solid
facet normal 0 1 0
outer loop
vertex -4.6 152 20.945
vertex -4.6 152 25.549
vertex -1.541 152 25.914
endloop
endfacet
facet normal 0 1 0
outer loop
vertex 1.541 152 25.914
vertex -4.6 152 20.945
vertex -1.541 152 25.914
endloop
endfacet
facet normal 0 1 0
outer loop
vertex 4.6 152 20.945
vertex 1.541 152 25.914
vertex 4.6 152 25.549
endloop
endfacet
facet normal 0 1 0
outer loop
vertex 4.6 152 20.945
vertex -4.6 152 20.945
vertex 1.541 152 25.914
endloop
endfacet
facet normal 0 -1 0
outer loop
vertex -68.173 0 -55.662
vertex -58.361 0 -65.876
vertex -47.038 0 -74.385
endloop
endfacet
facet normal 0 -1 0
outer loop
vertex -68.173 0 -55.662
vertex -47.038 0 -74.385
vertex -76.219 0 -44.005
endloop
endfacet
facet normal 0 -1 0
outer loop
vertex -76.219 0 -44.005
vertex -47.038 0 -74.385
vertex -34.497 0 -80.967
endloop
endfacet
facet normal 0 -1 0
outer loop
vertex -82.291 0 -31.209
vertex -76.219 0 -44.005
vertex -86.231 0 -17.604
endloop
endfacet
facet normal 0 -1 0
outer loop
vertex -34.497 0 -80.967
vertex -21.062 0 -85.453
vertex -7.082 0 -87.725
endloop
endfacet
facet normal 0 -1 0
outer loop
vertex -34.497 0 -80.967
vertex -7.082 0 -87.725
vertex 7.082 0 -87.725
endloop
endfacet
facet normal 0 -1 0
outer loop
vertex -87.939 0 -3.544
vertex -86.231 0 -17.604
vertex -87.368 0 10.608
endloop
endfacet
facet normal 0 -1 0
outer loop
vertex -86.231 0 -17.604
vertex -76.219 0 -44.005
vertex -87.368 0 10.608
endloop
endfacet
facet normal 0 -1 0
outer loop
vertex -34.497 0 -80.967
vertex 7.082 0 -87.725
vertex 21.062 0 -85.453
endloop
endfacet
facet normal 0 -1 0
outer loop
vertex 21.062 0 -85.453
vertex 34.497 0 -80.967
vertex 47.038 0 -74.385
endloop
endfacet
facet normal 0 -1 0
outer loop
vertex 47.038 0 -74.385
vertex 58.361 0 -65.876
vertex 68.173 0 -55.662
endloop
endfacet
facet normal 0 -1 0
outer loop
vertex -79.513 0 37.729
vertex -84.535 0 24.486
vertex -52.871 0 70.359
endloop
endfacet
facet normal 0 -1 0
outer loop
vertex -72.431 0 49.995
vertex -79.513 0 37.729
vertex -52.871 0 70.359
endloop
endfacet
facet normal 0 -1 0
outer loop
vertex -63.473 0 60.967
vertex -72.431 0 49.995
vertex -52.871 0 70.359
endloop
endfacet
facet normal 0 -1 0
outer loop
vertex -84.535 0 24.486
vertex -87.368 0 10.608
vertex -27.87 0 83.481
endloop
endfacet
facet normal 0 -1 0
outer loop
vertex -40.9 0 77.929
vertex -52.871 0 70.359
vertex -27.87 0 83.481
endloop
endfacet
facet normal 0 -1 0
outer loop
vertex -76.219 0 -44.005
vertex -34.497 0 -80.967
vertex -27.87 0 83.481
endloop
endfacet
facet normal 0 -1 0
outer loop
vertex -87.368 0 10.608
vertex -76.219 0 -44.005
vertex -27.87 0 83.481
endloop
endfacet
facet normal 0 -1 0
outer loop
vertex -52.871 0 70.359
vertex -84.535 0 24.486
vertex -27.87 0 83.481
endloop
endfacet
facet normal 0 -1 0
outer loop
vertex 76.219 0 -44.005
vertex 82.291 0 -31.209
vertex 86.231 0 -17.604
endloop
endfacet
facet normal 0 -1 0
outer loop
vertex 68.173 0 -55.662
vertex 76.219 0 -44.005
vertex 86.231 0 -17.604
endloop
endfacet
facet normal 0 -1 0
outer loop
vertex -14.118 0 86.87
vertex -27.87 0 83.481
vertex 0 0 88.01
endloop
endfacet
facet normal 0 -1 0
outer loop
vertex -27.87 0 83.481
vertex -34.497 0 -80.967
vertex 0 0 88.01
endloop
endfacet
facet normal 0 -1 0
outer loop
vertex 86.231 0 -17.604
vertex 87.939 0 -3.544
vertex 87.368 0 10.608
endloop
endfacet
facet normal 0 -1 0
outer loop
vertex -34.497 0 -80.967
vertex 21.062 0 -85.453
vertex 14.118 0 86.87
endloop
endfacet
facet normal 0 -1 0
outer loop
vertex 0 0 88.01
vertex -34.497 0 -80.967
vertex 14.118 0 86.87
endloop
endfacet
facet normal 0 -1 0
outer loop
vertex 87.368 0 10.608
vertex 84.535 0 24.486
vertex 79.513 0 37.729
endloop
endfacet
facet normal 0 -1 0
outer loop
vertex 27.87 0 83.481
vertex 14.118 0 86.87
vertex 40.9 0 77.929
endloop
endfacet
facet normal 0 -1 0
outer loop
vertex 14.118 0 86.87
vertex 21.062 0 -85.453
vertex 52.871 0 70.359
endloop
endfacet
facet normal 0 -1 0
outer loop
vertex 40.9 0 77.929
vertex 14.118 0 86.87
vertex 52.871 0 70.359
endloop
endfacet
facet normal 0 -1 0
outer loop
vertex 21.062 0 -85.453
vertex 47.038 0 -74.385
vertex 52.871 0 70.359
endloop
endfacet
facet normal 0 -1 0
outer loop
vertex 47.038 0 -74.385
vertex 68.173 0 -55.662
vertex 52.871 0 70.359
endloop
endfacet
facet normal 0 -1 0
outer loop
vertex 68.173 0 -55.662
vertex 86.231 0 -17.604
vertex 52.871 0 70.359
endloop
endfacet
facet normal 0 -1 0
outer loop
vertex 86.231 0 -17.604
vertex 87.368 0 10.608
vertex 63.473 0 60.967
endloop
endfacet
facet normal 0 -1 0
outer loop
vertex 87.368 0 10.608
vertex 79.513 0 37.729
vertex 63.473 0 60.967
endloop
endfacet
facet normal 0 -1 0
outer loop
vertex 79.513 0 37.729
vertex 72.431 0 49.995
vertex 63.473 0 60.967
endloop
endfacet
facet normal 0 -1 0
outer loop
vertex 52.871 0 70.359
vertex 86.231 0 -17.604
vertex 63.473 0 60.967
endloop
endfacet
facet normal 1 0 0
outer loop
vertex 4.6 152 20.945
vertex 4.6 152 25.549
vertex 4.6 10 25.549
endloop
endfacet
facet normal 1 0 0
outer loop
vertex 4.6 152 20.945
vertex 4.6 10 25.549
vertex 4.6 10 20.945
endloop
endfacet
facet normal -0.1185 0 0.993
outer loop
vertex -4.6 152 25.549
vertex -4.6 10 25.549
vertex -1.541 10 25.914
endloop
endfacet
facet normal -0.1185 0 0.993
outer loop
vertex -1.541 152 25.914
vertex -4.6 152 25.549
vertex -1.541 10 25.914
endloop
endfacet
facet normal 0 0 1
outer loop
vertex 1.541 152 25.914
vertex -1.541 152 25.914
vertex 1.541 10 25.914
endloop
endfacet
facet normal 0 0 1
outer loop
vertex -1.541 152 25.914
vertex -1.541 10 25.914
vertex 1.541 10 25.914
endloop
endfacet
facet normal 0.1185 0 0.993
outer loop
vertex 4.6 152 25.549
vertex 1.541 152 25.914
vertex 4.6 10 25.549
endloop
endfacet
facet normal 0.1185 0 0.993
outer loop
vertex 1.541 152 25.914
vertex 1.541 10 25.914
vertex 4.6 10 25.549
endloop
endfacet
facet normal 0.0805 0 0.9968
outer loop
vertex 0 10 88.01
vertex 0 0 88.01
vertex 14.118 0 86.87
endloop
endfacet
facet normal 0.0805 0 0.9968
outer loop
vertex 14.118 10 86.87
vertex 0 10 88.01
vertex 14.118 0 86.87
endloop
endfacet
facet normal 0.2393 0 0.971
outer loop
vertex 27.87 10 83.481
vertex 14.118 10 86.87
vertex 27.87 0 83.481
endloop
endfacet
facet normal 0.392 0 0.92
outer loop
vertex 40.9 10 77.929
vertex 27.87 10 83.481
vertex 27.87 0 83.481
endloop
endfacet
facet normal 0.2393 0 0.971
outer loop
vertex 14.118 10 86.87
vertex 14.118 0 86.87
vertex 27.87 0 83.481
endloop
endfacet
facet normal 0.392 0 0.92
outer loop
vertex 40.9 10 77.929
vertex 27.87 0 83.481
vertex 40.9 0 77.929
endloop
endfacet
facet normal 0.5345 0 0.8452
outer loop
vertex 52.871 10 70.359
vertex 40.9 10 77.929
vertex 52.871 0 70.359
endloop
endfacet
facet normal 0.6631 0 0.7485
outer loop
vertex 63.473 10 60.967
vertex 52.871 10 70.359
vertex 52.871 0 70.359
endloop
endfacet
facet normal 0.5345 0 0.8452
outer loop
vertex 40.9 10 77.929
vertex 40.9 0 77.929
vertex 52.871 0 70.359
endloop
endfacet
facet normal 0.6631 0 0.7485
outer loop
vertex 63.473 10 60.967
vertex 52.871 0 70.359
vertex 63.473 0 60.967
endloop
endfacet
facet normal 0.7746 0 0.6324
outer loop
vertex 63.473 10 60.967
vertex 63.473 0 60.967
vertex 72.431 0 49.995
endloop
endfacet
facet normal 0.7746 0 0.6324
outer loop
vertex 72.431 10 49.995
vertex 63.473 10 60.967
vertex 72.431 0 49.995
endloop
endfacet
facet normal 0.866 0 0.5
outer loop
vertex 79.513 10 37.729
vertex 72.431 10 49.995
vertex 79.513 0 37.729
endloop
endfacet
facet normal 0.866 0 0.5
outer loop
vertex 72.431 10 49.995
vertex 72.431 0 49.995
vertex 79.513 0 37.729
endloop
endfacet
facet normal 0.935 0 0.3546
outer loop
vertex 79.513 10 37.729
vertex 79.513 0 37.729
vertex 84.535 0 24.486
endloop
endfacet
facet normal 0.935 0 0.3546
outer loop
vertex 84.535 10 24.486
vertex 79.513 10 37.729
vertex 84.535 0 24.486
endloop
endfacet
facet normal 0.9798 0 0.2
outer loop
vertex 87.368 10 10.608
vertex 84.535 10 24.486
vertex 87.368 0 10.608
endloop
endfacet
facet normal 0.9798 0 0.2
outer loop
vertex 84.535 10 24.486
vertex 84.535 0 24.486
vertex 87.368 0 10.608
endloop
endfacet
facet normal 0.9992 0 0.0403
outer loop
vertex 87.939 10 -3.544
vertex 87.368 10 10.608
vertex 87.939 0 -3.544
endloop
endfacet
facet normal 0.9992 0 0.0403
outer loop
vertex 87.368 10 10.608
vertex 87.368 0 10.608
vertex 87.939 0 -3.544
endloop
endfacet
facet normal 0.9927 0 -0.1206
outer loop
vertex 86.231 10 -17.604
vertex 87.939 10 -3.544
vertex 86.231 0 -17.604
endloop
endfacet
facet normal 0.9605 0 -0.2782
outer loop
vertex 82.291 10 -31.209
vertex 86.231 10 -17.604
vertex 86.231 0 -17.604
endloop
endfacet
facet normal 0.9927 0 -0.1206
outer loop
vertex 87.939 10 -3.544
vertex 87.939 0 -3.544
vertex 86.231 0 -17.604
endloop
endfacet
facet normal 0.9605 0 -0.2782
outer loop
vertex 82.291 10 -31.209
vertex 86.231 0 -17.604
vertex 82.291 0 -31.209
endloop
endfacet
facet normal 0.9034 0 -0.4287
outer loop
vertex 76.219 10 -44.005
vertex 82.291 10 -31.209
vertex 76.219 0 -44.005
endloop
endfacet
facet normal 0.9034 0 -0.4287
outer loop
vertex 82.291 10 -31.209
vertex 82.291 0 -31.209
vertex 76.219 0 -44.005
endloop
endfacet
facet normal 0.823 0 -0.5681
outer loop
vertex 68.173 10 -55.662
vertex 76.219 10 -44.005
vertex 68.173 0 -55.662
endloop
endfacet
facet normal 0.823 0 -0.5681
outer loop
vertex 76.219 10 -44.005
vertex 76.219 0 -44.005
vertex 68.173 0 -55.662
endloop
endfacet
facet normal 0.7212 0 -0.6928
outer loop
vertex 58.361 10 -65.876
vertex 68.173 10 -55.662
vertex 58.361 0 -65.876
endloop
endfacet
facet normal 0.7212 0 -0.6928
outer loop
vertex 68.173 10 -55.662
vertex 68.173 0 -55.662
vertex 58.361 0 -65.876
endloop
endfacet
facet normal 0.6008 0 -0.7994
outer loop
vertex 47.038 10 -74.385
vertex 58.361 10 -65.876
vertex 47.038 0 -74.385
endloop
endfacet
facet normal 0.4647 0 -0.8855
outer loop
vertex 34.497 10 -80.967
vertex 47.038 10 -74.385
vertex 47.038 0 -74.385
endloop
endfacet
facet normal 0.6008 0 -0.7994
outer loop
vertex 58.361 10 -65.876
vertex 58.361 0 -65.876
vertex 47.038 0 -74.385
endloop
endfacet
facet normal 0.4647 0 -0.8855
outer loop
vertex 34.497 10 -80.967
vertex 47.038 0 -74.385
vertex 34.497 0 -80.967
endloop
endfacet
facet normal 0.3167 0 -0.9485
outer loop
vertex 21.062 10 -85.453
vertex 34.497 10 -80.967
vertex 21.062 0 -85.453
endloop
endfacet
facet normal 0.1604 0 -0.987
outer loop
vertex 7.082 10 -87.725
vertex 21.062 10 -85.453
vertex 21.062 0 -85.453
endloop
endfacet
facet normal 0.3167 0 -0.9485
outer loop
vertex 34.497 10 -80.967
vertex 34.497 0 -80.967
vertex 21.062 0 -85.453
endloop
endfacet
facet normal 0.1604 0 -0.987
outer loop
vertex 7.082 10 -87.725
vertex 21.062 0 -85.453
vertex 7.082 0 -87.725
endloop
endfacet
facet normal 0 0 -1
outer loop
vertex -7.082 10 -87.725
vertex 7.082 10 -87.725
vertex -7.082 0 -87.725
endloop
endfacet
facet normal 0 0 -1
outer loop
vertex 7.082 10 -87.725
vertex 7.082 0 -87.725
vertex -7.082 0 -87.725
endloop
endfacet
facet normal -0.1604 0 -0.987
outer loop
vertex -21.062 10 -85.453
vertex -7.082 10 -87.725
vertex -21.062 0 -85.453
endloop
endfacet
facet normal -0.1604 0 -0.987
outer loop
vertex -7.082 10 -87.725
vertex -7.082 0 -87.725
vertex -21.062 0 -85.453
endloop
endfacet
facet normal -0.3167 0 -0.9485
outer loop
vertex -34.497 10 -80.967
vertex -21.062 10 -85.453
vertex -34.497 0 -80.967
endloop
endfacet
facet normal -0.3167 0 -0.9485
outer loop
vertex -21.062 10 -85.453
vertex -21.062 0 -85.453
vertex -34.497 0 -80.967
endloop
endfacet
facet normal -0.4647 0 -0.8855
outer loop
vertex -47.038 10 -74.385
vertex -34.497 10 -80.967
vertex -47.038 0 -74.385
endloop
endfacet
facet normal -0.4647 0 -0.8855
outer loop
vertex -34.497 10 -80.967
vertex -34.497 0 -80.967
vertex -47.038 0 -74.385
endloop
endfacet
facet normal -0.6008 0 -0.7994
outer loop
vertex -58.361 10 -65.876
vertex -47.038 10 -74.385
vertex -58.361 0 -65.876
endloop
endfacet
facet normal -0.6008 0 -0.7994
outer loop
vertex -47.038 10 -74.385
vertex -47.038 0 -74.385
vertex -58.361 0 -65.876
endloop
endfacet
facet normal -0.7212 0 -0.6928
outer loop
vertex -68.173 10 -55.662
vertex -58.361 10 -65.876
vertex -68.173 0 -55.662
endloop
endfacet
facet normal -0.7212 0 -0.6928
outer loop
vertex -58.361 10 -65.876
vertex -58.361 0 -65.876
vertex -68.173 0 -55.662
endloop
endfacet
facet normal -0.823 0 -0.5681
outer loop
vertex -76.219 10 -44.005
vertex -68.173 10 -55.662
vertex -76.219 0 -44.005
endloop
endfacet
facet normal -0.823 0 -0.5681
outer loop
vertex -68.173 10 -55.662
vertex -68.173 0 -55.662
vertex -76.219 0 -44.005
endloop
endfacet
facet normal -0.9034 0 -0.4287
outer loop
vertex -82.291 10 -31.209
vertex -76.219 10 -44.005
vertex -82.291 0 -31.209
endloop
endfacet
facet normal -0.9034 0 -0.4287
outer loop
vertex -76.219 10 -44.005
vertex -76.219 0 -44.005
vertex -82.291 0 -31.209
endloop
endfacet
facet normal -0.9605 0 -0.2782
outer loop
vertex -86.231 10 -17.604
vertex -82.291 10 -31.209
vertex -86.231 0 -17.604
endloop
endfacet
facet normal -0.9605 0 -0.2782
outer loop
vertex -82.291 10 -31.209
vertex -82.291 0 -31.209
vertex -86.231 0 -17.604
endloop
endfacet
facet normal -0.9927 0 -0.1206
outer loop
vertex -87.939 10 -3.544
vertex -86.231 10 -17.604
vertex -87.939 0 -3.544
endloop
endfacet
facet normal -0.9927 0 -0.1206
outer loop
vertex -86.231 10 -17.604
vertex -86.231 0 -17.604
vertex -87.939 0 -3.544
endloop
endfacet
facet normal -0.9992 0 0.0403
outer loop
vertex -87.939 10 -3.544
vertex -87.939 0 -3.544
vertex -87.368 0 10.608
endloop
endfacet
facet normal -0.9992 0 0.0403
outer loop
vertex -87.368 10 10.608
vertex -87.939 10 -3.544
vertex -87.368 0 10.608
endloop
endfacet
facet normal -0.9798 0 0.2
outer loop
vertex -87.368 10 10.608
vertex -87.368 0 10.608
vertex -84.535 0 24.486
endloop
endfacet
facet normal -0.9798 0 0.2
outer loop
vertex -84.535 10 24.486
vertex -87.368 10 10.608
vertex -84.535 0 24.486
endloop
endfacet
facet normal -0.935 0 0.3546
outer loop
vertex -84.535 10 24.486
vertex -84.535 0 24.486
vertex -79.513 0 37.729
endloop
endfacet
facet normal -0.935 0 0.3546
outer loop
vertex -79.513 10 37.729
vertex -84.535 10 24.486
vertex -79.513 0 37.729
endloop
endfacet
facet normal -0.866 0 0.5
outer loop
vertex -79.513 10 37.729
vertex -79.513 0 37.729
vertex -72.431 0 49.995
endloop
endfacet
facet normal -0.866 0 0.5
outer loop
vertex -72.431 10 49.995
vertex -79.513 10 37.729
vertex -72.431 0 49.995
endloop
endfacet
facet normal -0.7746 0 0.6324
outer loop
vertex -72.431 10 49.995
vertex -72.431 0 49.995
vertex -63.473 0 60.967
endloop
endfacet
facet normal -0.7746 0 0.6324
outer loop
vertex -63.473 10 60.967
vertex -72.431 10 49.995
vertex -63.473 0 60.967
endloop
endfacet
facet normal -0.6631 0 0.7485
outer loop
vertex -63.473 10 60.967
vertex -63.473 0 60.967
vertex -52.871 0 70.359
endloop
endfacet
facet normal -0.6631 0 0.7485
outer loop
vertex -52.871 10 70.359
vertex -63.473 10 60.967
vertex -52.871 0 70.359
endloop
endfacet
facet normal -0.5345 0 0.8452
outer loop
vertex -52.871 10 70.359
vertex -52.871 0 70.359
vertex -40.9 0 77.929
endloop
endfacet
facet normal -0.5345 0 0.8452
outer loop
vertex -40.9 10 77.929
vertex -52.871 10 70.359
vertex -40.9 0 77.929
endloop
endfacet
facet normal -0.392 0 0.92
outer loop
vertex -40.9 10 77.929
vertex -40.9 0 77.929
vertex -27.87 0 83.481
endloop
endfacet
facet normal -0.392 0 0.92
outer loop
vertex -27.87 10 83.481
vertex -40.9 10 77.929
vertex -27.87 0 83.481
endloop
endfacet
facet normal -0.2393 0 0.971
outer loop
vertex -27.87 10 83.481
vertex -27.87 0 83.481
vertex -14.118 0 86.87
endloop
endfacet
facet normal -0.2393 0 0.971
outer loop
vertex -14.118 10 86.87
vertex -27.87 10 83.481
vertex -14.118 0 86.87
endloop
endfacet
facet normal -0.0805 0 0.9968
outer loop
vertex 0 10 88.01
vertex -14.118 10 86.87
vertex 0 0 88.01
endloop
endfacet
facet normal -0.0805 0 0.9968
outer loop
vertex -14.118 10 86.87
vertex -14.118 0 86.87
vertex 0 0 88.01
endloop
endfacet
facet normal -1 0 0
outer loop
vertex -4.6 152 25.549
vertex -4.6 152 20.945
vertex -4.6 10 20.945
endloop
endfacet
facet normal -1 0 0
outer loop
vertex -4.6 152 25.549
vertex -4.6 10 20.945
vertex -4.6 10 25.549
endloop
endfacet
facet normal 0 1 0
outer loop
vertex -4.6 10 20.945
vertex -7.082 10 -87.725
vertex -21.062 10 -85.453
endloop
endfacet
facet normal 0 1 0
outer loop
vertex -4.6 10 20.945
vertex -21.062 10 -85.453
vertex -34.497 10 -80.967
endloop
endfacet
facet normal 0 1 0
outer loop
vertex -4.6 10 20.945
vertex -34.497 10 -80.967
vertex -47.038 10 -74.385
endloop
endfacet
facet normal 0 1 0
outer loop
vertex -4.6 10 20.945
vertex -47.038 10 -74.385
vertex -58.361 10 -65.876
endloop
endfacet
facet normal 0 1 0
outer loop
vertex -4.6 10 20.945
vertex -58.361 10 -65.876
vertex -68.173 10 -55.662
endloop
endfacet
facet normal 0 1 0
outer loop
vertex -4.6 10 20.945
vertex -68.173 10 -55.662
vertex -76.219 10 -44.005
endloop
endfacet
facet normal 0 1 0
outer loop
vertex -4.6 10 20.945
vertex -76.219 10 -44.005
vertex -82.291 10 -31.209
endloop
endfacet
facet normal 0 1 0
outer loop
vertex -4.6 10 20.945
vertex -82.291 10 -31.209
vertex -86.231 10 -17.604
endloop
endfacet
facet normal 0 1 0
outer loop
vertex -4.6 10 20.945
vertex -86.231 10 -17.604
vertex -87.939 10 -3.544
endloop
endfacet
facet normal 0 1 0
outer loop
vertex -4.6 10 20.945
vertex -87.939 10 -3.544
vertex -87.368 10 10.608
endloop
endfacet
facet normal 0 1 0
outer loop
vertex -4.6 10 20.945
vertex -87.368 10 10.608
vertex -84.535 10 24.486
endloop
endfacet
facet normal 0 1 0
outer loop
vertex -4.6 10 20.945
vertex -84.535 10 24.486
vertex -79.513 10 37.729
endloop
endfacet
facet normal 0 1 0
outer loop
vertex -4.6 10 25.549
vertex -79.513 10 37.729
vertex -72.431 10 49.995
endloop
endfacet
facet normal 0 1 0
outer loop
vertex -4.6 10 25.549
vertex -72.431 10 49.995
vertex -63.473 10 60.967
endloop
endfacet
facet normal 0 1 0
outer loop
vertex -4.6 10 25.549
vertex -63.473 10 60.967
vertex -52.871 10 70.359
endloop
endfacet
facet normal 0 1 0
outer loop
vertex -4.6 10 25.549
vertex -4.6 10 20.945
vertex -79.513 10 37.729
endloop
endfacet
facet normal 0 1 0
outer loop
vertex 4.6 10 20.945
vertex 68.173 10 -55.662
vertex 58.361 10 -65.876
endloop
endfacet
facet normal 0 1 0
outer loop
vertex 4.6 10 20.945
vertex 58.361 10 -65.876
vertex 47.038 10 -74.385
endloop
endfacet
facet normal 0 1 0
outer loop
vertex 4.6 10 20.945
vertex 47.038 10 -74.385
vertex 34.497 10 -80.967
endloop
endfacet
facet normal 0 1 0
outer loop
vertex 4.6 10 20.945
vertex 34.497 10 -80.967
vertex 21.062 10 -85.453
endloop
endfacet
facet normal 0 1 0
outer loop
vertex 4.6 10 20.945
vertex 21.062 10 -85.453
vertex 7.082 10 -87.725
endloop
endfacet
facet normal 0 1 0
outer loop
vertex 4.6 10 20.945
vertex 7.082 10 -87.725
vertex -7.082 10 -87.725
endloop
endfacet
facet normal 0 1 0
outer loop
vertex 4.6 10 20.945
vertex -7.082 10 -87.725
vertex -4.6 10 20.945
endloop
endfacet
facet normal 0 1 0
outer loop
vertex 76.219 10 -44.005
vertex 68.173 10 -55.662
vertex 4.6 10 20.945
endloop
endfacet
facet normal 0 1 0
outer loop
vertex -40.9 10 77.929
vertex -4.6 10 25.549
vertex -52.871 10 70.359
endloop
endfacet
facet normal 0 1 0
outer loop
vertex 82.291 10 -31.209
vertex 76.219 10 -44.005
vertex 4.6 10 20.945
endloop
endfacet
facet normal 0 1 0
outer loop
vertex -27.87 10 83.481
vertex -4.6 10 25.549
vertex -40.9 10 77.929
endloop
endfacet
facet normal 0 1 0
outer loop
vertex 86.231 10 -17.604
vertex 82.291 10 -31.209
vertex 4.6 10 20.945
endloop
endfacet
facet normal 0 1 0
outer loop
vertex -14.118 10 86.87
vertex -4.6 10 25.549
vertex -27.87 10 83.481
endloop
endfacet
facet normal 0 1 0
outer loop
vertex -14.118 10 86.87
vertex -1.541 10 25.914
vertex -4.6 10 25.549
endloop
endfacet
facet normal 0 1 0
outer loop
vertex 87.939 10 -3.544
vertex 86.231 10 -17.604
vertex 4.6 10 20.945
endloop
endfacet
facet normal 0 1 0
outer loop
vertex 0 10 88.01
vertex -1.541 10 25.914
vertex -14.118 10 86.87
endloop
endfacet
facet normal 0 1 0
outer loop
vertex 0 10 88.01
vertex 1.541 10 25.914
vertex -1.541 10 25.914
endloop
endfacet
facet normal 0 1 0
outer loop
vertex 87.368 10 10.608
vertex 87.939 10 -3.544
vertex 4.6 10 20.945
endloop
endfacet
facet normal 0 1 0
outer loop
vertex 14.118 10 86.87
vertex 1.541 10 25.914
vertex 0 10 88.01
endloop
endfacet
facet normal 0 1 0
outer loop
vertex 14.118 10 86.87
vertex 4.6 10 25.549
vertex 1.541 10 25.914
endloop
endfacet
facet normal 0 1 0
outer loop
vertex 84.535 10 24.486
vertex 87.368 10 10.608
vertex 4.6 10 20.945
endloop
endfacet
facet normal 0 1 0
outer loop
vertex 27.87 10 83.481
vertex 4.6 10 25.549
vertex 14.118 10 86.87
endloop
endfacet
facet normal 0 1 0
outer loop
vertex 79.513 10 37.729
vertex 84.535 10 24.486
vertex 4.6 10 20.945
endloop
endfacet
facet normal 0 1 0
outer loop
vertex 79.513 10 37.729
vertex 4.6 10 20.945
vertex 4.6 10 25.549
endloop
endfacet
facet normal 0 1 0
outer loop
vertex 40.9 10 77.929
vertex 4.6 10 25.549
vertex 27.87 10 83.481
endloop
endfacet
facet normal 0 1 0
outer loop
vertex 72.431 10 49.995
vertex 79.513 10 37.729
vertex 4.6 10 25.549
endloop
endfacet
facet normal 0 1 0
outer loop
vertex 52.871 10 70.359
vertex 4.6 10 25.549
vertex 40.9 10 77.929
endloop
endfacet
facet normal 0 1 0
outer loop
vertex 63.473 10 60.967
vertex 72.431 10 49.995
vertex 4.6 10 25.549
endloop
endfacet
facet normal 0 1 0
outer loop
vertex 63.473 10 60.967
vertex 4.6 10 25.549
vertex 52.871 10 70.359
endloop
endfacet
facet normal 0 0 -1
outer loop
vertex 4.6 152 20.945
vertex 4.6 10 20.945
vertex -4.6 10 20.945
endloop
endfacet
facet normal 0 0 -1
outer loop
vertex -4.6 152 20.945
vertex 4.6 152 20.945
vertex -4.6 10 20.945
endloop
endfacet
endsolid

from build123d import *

# Parameters (mm, degrees)
SKETCH1_R           = 88.009986391
BOSS_EXTRUDE1_DEPTH = 10
BOSS_EXTRUDE5_DEPTH = 142


with BuildPart() as part:
    # Sketch1 → Boss-Extrude1 (new body)
    with BuildSketch(Plane(origin=(0, 0, 0), x_dir=(1, 0, 0), z_dir=(0, 1, 0))):
        with Locations(Location((0, 0, 0), (0, 0, 270))):
            Circle(SKETCH1_R)
    extrude(amount=BOSS_EXTRUDE1_DEPTH)

    # Sketch3 → Boss-Extrude5 (add)
    with BuildSketch(Plane(origin=(0, 10, 0), x_dir=(1, 0, 0), z_dir=(0, 1, 0))):
        with BuildLine():
            Line((-4.6, -20.945), (-4.6, -25.549199596))
            ThreePointArc((-4.6, -25.549199596), (0, -25.96), (4.6, -25.549199596))
            Line((4.6, -25.549199596), (4.6, -20.945))
            Line((4.6, -20.945), (-4.6, -20.945))
        make_face()
    extrude(amount=BOSS_EXTRUDE5_DEPTH)


solid = part.part
